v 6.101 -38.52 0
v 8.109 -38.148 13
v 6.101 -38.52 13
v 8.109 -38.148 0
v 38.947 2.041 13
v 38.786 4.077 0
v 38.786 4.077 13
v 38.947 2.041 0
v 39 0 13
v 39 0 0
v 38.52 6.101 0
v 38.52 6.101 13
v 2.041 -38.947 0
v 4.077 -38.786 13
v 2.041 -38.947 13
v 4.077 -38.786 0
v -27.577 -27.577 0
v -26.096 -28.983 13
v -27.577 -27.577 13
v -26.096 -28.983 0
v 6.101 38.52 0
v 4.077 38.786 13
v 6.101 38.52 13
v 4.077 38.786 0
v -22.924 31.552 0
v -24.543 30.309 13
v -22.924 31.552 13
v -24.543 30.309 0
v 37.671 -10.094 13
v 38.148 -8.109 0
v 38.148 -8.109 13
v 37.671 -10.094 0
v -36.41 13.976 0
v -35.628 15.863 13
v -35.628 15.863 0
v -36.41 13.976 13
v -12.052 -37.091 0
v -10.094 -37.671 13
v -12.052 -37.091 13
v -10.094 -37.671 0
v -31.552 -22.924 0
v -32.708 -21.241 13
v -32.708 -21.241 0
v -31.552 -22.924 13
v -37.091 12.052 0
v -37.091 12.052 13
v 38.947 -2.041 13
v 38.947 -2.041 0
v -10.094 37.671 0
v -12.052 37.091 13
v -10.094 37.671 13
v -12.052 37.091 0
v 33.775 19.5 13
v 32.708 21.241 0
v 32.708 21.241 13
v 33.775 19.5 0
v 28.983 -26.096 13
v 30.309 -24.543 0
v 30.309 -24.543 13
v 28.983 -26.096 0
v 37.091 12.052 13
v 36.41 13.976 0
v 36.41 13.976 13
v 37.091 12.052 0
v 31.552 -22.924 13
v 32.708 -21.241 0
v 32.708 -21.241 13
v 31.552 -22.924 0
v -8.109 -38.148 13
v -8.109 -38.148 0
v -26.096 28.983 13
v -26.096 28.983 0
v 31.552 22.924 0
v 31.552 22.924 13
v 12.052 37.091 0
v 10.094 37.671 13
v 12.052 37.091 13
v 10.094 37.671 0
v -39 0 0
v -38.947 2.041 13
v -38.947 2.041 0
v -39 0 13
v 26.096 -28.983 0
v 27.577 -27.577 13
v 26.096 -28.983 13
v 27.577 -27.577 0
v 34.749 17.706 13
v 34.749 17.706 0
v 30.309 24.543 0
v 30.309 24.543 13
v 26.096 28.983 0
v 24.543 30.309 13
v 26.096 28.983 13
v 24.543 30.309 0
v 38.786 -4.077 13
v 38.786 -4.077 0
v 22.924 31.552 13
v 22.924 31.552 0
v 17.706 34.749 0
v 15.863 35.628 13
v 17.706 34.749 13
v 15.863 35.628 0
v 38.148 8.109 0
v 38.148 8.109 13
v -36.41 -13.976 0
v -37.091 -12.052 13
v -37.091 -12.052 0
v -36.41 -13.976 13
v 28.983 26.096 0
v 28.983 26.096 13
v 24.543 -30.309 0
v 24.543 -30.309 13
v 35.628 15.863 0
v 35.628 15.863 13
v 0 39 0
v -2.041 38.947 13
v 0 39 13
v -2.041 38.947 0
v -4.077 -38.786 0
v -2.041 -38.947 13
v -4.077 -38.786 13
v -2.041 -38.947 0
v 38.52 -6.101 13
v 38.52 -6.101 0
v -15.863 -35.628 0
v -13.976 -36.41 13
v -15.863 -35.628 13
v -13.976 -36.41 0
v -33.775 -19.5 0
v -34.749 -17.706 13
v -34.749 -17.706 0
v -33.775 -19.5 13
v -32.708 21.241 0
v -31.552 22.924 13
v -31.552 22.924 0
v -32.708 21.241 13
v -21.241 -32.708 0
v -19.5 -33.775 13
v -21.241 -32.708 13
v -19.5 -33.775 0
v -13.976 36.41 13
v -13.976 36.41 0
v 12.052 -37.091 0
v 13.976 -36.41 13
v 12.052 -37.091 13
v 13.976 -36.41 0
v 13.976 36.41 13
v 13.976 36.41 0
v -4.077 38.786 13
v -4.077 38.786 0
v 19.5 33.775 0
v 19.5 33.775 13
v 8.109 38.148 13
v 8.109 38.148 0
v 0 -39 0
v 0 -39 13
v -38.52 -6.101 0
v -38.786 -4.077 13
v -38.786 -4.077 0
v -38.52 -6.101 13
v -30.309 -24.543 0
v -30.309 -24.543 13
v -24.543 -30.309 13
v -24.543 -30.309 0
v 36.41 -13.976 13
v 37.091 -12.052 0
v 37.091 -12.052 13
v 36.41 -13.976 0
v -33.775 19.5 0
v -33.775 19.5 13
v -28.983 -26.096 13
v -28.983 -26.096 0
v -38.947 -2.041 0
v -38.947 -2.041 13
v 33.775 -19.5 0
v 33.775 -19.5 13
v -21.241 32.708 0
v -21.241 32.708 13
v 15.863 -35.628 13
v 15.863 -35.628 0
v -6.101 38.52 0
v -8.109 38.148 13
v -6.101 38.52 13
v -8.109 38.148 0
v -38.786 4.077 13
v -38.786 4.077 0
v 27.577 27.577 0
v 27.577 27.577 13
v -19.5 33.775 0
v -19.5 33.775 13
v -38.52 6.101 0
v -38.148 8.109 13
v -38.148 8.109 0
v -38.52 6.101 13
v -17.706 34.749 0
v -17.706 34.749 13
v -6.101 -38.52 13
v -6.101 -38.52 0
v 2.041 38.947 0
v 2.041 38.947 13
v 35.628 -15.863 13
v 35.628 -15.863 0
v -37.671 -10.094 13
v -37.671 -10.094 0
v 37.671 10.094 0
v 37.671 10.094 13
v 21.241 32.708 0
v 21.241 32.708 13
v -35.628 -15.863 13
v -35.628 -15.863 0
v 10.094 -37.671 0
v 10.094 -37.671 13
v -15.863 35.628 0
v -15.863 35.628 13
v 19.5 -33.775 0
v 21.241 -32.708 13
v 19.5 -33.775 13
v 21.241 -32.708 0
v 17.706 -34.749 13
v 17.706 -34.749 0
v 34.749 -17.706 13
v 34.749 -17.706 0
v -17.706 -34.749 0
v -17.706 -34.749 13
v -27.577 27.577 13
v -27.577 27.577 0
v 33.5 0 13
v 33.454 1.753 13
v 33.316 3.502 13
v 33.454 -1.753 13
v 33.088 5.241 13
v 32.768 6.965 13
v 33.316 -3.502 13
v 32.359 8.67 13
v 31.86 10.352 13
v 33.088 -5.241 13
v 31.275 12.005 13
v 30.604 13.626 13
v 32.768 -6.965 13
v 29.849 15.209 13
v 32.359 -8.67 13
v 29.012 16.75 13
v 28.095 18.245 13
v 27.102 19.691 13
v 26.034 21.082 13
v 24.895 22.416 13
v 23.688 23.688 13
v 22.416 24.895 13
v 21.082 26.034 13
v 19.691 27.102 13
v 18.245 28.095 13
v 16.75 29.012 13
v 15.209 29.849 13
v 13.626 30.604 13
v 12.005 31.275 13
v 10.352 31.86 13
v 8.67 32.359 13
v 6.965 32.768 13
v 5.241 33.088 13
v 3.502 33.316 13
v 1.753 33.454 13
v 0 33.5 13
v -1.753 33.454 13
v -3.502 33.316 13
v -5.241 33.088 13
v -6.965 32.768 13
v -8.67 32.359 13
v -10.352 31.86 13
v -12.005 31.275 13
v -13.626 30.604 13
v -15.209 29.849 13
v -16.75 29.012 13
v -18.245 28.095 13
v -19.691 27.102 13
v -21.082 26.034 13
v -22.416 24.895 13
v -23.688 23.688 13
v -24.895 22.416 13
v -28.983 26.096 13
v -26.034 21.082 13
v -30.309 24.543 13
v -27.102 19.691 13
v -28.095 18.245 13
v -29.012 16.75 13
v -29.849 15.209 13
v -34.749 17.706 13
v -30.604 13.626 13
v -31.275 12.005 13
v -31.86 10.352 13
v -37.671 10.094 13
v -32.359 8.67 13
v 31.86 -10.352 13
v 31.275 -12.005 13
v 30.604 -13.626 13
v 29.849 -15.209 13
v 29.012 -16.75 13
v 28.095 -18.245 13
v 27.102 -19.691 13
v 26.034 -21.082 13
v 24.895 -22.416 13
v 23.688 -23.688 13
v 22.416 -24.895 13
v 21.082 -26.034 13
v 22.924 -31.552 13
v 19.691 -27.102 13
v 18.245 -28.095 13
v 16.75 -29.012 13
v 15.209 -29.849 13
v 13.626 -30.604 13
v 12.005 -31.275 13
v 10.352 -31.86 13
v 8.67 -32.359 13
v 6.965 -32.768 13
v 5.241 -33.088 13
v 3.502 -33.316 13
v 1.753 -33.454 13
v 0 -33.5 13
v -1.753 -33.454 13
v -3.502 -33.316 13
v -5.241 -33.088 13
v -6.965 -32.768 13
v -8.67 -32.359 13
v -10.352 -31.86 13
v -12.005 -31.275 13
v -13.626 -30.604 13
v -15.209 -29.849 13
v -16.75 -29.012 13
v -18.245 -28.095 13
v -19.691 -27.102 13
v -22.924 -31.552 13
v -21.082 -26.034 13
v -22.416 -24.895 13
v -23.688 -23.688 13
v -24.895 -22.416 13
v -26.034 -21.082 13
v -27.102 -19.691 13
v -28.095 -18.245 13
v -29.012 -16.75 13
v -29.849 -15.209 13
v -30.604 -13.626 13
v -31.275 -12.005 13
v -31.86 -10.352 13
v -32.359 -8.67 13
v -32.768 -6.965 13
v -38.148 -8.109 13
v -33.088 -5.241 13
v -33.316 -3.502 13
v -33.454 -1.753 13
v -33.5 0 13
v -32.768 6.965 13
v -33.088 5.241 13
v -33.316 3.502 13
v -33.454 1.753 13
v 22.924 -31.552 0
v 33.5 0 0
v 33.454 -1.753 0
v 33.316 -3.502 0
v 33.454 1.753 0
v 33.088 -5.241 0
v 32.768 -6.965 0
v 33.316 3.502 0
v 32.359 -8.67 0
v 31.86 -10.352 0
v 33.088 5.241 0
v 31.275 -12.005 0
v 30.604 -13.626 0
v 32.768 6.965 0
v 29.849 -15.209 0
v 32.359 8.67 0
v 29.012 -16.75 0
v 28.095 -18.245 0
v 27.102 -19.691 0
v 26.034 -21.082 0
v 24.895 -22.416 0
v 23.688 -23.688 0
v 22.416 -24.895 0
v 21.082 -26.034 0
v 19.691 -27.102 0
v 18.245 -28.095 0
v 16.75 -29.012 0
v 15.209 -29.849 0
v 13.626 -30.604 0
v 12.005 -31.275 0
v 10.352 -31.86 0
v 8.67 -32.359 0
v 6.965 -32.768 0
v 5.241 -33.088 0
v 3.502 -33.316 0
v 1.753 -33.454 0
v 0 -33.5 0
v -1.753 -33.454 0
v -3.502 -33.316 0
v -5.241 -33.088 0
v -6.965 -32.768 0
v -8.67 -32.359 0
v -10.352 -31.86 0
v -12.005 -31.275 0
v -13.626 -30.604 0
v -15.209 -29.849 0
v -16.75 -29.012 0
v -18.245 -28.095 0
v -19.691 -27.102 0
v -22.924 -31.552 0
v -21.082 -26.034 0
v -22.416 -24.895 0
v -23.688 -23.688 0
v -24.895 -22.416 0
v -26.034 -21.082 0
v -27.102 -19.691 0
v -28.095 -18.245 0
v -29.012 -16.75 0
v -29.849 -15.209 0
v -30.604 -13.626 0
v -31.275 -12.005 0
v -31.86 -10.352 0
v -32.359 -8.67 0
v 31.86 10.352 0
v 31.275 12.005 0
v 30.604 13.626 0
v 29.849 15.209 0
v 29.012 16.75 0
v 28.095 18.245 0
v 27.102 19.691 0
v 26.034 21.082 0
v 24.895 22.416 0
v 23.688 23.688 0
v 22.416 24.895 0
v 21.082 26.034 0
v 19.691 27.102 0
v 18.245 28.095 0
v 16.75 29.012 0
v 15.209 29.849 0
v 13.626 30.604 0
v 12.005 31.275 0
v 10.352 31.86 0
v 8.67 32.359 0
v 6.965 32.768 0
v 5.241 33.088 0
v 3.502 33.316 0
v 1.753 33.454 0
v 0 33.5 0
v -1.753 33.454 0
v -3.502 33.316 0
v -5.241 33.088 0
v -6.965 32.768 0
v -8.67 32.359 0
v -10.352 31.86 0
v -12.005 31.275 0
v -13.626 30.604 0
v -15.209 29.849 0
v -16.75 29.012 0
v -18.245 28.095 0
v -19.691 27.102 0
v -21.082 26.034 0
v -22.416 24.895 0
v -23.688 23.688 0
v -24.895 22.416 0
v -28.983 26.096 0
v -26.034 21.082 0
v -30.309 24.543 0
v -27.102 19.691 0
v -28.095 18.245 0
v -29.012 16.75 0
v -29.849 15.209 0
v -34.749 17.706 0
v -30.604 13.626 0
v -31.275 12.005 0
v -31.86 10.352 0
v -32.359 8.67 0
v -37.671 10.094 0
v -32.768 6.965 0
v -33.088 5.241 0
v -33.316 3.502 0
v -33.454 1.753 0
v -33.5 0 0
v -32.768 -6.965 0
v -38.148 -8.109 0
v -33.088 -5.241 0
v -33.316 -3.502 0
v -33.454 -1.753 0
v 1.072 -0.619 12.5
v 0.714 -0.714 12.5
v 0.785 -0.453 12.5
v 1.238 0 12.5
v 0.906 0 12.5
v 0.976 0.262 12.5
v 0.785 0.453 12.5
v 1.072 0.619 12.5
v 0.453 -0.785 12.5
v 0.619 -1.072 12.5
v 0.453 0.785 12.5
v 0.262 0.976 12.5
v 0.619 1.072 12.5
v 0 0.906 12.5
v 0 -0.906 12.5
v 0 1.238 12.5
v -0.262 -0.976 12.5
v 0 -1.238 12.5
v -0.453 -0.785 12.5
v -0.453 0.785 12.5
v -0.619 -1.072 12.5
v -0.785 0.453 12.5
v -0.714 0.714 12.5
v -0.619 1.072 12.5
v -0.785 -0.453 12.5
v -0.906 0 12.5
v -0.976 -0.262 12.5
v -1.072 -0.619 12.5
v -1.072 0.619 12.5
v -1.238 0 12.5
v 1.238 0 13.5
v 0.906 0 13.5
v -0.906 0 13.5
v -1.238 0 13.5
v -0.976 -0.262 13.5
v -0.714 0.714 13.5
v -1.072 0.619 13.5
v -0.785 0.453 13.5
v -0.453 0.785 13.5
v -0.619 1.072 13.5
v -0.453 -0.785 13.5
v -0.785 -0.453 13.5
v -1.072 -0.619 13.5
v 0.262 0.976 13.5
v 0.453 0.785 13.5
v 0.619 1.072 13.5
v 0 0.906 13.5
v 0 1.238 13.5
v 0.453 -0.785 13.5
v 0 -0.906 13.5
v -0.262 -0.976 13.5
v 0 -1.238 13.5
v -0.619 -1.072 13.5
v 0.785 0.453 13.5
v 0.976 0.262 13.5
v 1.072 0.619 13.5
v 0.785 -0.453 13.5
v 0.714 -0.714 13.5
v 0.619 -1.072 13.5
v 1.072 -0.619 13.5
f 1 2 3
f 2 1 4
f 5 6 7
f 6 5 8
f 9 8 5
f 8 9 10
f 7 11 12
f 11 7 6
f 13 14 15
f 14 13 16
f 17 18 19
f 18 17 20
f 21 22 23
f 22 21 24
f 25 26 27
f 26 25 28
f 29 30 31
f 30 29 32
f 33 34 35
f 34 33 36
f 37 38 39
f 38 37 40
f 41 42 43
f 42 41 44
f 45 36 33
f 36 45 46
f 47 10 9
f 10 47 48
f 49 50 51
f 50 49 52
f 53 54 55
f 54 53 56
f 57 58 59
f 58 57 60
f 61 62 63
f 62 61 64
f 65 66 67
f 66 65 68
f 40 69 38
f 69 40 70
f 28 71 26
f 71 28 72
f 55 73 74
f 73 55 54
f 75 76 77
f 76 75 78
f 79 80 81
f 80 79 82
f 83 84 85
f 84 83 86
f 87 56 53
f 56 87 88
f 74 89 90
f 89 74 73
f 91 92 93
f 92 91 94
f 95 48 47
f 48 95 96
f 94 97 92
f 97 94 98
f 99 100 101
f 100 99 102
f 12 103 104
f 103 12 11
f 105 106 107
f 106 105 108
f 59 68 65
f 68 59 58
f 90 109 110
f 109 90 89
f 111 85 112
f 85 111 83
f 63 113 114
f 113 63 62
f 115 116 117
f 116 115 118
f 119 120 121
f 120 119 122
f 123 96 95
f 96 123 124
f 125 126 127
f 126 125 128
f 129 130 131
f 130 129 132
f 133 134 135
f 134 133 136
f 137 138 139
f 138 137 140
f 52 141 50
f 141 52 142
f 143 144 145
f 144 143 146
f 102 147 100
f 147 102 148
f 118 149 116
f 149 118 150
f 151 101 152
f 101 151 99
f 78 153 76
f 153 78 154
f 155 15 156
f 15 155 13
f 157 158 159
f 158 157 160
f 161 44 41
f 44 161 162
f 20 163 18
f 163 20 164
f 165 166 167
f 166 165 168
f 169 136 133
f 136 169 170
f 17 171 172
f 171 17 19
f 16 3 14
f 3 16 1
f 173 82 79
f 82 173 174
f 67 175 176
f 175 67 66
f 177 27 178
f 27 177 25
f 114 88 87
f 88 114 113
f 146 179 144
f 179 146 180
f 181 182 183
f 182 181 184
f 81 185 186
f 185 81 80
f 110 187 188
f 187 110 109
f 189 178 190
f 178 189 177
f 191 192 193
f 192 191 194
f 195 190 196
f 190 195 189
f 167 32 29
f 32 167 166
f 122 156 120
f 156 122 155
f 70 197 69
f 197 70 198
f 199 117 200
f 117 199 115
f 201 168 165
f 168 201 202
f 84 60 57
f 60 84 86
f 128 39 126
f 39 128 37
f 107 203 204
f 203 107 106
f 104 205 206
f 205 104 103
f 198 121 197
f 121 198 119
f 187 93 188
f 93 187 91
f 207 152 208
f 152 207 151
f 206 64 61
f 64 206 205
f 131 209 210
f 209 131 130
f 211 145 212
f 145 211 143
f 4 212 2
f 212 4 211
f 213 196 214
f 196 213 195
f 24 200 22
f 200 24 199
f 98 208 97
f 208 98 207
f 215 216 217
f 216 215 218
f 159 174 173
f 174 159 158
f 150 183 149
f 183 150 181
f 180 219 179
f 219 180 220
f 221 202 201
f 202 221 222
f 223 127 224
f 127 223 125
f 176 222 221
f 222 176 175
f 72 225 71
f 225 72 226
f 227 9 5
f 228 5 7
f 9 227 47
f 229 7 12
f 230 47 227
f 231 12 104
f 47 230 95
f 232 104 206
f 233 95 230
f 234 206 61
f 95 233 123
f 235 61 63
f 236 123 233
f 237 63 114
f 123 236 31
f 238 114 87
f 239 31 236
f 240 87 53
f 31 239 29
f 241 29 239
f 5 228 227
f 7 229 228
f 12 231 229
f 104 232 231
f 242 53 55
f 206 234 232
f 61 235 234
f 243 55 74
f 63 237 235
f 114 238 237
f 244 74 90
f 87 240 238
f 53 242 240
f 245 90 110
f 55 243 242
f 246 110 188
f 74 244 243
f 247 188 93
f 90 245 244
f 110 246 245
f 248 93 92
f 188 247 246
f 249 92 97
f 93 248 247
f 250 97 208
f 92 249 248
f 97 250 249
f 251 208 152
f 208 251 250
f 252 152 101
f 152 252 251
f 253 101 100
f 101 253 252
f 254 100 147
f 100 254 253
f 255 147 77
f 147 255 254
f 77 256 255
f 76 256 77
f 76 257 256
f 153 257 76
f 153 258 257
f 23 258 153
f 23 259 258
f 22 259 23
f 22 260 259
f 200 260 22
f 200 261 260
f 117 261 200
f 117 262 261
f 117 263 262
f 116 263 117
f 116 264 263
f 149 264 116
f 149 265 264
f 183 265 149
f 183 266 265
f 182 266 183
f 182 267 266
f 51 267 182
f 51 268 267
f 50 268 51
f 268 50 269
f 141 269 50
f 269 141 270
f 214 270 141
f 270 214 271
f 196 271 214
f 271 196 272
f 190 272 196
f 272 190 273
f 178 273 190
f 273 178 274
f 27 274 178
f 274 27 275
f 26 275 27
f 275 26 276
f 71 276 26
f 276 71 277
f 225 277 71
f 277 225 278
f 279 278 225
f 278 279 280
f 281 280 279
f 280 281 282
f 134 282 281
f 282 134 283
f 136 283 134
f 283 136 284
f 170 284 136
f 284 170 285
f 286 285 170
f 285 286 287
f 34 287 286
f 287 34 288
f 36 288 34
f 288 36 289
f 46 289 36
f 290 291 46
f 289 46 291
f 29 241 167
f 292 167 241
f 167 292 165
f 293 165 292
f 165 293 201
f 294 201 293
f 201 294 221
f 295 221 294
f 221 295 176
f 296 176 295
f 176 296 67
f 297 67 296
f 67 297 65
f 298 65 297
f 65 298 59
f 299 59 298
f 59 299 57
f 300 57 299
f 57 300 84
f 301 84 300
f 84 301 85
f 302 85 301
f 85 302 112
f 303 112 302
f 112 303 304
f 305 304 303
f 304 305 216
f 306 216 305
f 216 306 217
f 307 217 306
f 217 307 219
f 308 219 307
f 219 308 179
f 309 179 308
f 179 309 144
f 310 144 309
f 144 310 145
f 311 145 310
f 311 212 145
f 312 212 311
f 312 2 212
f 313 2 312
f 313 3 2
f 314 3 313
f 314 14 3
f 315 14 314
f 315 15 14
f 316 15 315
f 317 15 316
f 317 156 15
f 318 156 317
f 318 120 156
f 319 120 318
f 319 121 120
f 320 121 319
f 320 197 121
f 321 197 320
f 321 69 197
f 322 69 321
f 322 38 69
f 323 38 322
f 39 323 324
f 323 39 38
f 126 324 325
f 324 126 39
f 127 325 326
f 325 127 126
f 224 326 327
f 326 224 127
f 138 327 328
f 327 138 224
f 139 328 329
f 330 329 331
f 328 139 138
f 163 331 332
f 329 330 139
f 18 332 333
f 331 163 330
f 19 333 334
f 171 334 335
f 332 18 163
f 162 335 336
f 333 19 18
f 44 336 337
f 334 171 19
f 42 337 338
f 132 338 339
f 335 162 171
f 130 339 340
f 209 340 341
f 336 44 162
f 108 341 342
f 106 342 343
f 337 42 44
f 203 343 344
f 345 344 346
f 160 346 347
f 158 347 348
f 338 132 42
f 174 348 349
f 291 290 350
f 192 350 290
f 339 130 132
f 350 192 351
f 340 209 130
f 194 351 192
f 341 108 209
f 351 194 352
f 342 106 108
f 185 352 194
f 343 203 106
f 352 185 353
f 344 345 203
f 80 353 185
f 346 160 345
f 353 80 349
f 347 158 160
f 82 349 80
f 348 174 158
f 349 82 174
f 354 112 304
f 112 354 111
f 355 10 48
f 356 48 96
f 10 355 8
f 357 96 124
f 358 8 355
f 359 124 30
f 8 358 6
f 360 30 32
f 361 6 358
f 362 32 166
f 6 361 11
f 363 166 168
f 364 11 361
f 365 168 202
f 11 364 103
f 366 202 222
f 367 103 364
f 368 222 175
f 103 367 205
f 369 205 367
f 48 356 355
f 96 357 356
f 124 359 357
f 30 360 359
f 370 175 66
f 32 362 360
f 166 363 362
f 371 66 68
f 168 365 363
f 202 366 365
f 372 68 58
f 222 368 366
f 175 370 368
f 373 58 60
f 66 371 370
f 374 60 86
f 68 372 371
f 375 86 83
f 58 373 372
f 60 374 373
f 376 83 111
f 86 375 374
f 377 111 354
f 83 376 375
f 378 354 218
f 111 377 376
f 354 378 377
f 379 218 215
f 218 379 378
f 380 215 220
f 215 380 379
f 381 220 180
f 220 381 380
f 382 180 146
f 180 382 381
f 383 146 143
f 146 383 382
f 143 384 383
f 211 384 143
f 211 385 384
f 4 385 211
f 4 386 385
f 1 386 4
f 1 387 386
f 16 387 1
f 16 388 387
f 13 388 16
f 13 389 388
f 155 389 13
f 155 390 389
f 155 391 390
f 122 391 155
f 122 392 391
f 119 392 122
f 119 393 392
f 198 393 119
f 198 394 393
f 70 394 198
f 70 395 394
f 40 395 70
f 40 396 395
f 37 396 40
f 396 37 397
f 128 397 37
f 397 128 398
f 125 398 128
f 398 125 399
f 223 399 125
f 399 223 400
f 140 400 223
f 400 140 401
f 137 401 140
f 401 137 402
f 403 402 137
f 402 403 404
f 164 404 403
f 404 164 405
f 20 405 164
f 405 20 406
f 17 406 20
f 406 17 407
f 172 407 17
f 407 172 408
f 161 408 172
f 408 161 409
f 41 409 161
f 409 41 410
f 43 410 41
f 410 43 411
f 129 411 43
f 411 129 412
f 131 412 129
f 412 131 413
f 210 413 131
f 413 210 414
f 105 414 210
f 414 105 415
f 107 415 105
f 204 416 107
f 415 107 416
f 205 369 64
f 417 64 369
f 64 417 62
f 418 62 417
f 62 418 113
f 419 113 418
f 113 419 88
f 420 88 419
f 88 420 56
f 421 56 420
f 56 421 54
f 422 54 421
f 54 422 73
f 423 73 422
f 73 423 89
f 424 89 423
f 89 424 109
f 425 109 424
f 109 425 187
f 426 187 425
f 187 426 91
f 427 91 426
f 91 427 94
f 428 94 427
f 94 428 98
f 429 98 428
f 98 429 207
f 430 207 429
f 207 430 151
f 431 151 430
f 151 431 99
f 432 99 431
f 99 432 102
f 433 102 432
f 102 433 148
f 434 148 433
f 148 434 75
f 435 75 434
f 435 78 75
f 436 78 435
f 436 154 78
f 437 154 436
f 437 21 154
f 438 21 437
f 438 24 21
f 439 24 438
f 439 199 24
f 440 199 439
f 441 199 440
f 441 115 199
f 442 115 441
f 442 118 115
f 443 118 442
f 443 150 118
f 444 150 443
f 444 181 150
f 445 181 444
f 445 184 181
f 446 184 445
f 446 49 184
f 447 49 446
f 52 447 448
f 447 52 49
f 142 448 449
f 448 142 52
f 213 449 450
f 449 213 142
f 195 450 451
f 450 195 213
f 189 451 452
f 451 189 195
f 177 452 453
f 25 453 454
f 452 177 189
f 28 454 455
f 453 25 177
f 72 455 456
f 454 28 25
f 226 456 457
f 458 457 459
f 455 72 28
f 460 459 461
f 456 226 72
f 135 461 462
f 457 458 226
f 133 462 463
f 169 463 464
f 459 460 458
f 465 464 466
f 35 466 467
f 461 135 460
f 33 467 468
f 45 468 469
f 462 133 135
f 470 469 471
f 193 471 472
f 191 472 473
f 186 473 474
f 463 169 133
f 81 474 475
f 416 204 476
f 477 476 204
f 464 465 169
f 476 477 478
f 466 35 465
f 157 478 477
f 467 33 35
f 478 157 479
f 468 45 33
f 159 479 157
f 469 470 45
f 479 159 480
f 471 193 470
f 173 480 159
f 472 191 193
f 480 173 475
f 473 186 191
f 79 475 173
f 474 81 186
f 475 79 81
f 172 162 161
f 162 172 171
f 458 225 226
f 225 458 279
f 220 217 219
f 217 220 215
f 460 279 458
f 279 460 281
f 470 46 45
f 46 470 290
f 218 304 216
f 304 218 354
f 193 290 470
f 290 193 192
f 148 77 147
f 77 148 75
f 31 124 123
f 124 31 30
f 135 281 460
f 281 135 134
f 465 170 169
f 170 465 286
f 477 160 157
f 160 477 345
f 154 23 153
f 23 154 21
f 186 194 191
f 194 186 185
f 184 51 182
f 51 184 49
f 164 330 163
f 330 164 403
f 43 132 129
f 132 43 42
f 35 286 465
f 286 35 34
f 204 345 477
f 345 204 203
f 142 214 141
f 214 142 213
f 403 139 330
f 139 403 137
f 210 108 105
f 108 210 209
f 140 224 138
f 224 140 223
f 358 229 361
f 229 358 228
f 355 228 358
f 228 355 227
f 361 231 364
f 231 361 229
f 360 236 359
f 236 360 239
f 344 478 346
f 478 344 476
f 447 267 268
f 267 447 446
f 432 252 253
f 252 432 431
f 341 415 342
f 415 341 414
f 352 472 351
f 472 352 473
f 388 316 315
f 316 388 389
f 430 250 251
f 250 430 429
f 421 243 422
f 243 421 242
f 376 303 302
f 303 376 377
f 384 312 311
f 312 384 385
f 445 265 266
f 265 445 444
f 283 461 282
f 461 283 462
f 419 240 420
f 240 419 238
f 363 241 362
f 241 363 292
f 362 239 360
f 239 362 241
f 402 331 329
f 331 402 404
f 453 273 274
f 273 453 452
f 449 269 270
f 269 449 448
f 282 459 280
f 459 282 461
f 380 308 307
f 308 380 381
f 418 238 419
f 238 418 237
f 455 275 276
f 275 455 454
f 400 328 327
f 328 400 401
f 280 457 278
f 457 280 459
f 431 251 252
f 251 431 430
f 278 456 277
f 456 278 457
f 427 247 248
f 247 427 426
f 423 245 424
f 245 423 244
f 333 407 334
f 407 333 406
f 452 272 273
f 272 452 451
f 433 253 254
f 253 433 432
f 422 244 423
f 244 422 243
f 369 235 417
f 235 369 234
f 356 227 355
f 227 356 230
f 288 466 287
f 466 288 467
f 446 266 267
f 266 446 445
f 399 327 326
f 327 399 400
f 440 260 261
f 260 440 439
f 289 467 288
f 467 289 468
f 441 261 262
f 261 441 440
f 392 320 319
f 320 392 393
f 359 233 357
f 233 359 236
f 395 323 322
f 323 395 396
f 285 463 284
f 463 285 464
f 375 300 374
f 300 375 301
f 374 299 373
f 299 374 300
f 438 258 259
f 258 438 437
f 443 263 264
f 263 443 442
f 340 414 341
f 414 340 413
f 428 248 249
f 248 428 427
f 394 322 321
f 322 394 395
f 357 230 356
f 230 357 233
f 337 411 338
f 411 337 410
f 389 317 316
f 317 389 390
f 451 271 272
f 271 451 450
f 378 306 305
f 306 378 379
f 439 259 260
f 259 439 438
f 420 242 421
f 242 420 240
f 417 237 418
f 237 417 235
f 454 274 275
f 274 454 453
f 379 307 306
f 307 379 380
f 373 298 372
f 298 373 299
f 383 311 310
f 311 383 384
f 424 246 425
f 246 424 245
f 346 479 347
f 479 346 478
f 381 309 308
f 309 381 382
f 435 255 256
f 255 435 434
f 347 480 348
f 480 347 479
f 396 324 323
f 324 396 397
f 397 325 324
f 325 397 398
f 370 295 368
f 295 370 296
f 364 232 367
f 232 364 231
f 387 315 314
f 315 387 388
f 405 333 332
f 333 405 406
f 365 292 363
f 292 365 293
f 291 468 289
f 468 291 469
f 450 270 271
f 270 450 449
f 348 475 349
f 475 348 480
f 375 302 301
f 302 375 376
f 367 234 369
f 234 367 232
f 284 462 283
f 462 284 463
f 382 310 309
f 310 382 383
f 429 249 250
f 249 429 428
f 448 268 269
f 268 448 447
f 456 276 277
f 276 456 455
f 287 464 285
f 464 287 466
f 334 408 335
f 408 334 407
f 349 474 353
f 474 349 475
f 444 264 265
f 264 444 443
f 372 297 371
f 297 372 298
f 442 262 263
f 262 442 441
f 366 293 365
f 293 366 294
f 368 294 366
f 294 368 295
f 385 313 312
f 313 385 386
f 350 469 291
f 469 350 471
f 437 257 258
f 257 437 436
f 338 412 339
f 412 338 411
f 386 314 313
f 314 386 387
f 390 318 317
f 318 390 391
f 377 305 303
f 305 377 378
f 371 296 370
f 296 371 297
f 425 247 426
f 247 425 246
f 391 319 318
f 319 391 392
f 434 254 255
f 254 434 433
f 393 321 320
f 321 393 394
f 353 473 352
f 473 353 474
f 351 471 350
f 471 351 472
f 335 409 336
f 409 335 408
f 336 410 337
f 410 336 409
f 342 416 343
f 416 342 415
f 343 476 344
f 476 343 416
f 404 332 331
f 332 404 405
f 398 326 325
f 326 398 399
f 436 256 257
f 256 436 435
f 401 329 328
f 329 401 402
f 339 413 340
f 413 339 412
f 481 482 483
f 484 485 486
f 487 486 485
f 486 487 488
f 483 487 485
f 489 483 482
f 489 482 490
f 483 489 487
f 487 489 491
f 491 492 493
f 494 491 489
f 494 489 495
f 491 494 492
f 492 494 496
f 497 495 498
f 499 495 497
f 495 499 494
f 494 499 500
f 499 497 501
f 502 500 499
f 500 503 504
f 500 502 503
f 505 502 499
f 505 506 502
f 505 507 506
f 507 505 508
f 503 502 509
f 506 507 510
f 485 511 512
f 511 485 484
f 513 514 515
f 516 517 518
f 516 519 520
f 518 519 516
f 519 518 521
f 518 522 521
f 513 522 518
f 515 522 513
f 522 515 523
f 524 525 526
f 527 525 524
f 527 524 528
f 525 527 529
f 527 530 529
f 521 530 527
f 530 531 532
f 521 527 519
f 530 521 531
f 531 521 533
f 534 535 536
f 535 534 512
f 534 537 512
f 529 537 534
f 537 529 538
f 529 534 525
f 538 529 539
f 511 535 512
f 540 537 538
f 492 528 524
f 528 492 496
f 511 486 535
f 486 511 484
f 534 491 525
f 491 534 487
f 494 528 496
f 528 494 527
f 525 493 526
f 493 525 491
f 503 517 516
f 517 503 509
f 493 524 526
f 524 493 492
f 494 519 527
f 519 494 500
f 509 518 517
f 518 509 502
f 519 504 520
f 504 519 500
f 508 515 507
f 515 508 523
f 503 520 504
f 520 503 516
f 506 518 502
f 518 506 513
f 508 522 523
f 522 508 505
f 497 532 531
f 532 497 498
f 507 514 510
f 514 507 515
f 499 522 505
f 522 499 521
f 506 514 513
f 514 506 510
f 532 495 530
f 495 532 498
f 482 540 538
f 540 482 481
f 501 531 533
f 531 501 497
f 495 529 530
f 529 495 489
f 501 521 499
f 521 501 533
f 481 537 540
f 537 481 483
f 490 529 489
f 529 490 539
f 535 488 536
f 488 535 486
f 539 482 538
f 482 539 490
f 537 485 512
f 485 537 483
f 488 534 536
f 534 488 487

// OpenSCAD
// Enhanced Drone Nose Cone - Parametric Design with Multiple Profiles
// Based on specifications from April 17, 2025

/* Base Parameters */
// Basic dimensions
inner_diameter = 67;  // mm
outer_diameter = 78;  // mm
base_ring_depth = 13; // mm
cone_angle = 52;      // degrees

// Calculated parameters
inner_radius = inner_diameter / 2;
outer_radius = outer_diameter / 2;
wall_thickness = outer_radius - inner_radius;

// Derived dimensions
// Calculate cone height based on angle and radius difference
cone_height = (outer_radius - inner_radius) / tan(cone_angle);
// Add some height for the rounded tip
total_cone_height = cone_height * 1.2;  

/* Design Parameters */
// Profile type: "conical", "ogive", "elliptical", "karman", "tangent"
profile_type = "conical";  // Default to conical

// Nose rounding parameters
tip_rounding_radius = outer_radius * 0.5;
tip_rounding_factor = 0.5;  // As a proportion of outer radius

// Lightweighting parameters
use_lightweighting = true;
shell_thickness = 1.2;  // mm - wall thickness for hollow parts
wall_thinning_factor = 1.0;  // 1.0 = uniform thickness, <1.0 = thinner at tip
internal_ribs = true;
rib_thickness = 1.0;    // mm
rib_count = 6;          // number of radial ribs

// Resolution parameters for smooth curves
$fn = 120;  // Facet number for cylinders and spheres

/* Profile Functions */
// Generate points for a profile curve
function generate_profile_points(type, length, radius, steps=100) =
    type == "conical" ? conical_profile(length, radius, steps) :
    type == "ogive" ? ogive_profile(length, radius, steps) :
    type == "elliptical" ? elliptical_profile(length, radius, steps) :
    type == "karman" ? karman_profile(length, radius, steps) :
    type == "tangent" ? tangent_ogive_profile(length, radius, steps) :
    conical_profile(length, radius, steps);  // Default

// Conical profile with rounded tip
function conical_profile(length, radius, steps=100) =
    let(
        tip_radius = radius * tip_rounding_factor,
        cone_length = length - tip_radius,
        cone_points = [for(i = [0:steps]) 
            let(z = i * cone_length / steps)
            [radius * (1 - z / cone_length), z]],
        tip_points = [for(i = [0:steps]) 
            let(angle = i * 90 / steps, 
                z = cone_length + tip_radius * sin(angle),
                r = tip_radius * cos(angle))
            [r, z]]
    )
    concat(cone_points, tip_points);

// Ogive (parabolic) profile
function ogive_profile(length, radius, steps=100) =
    [for(i = [0:steps]) 
        let(z = i * length / steps)
        [radius * (1 - pow(z/length, 2)), z]];

// Elliptical profile
function elliptical_profile(length, radius, steps=100) =
    [for(i = [0:steps]) 
        let(z = i * length / steps)
        [radius * sqrt(1 - pow(z/length, 2)), z]];

// Von Kármán profile (Haack series with C=0)
function karman_profile(length, radius, steps=100) =
    [for(i = [0:steps]) 
        let(theta = i * 180 / steps,
            z = length * (1 - cos(theta)) / 2,
            r = radius * sqrt((theta - sin(2*theta)/2) / 180))
        [r, z]];

// Tangent ogive profile
function tangent_ogive_profile(length, radius, steps=100) =
    let(
        rho = (pow(length, 2) + pow(radius, 2)) / (2 * radius),
        x_offset = length - sqrt(pow(rho, 2) - pow(rho - radius, 2))
    )
    [for(i = [0:steps]) 
        let(z = i * length / steps,
            r = z <= length ? 
                sqrt(pow(rho, 2) - pow(z - x_offset, 2)) - (rho - radius) : 0)
        [r, z]];

/* 3D Geometry Modules */
// Generate a 3D nose cone from a 2D profile
module nose_cone_from_profile(profile, steps=100) {
    // Rotate points around Z axis to create the 3D shape
    rotate_extrude() {
        polygon(profile);
    }
}

// Create the hollow interior for lightweighting
module nose_cone_hollow(profile, steps=100, shell_thickness=1.2, wall_thinning=1.0) {
    // Adjust the profile to create the interior hollow
    adjusted_profile = [for(i = [0:len(profile)-1])
        let(
            original_radius = profile[i][0],
            z_position = profile[i][1],
            z_ratio = z_position / total_cone_height,
            // Apply wall thinning toward the tip
            adjusted_thickness = shell_thickness * (1 - (1 - wall_thinning) * z_ratio),
            new_radius = max(0, original_radius - adjusted_thickness)
        )
        [new_radius, z_position]
    ];
    
    // Create the hollow by extruding the adjusted profile
    rotate_extrude() {
        polygon(adjusted_profile);
    }
}

// Create internal support ribs
module internal_ribs(profile, rib_count=6, rib_thickness=1.0) {
    // Calculate the maximum height for ribs
    max_height = total_cone_height * 0.8;
    
    // Create each rib
    for (i = [0:rib_count-1]) {
        rotate([0, 0, i * (360 / rib_count)]) {
            // Vertical rib
            intersection() {
                // Create the basic rib shape
                linear_extrude(height=max_height) {
                    polygon([
                        [0, 0],
                        [outer_radius, 0],
                        [0, max_height * 0.8]
                    ]);
                }
                
                // Intersect with the nose cone to shape the rib
                nose_cone_from_profile(profile);
            }
            
            // Add a triangular reinforcement at the base
            translate([0, 0, base_ring_depth]) {
                linear_extrude(height=rib_thickness, center=true) {
                    polygon([
                        [0, 0],
                        [0, max_height * 0.3],
                        [max_height * 0.3, 0]
                    ]);
                }
            }
        }
    }
}

/* Main Module */
module nose_cone() {
    // Generate the appropriate profile based on the selected type
    profile = generate_profile_points(profile_type, total_cone_height, outer_radius);
    
    // Translate the profile to the base ring
    full_profile = [for(p = profile) [p[0], p[1] + base_ring_depth]];
    
    // Create the combined profile including the base ring
    base_profile = [
        [inner_radius, 0],
        [outer_radius, 0],
        [outer_radius, base_ring_depth],
        [inner_radius, base_ring_depth]
    ];
    
    complete_profile = concat([[0, 0]], base_profile, [[0, base_ring_depth]]);
    
    difference() {
        union() {
            // Base ring
            difference() {
                cylinder(h=base_ring_depth, r=outer_radius);
                translate([0, 0, -0.1])
                    cylinder(h=base_ring_depth + 0.2, r=inner_radius);
            }
            
            // Nose cone from profile
            nose_cone_from_profile(full_profile);
        }
        
        // Hollow out the inside if using lightweighting
        if (use_lightweighting) {
            translate([0, 0, base_ring_depth]) {
                nose_cone_hollow(profile, shell_thickness=shell_thickness, 
                                wall_thinning=wall_thinning_factor);
            }
        }
    }
    
    // Add internal support ribs if enabled
    if (use_lightweighting && internal_ribs) {
        internal_ribs(full_profile, rib_count=rib_count, rib_thickness=rib_thickness);
    }
}

/* Render the nose cone */
nose_cone();

/* 
// Cross section view for debugging
difference() {
    nose_cone();
    translate([-100, 0, -10])
        cube([200, 200, 200]);
}
*/
